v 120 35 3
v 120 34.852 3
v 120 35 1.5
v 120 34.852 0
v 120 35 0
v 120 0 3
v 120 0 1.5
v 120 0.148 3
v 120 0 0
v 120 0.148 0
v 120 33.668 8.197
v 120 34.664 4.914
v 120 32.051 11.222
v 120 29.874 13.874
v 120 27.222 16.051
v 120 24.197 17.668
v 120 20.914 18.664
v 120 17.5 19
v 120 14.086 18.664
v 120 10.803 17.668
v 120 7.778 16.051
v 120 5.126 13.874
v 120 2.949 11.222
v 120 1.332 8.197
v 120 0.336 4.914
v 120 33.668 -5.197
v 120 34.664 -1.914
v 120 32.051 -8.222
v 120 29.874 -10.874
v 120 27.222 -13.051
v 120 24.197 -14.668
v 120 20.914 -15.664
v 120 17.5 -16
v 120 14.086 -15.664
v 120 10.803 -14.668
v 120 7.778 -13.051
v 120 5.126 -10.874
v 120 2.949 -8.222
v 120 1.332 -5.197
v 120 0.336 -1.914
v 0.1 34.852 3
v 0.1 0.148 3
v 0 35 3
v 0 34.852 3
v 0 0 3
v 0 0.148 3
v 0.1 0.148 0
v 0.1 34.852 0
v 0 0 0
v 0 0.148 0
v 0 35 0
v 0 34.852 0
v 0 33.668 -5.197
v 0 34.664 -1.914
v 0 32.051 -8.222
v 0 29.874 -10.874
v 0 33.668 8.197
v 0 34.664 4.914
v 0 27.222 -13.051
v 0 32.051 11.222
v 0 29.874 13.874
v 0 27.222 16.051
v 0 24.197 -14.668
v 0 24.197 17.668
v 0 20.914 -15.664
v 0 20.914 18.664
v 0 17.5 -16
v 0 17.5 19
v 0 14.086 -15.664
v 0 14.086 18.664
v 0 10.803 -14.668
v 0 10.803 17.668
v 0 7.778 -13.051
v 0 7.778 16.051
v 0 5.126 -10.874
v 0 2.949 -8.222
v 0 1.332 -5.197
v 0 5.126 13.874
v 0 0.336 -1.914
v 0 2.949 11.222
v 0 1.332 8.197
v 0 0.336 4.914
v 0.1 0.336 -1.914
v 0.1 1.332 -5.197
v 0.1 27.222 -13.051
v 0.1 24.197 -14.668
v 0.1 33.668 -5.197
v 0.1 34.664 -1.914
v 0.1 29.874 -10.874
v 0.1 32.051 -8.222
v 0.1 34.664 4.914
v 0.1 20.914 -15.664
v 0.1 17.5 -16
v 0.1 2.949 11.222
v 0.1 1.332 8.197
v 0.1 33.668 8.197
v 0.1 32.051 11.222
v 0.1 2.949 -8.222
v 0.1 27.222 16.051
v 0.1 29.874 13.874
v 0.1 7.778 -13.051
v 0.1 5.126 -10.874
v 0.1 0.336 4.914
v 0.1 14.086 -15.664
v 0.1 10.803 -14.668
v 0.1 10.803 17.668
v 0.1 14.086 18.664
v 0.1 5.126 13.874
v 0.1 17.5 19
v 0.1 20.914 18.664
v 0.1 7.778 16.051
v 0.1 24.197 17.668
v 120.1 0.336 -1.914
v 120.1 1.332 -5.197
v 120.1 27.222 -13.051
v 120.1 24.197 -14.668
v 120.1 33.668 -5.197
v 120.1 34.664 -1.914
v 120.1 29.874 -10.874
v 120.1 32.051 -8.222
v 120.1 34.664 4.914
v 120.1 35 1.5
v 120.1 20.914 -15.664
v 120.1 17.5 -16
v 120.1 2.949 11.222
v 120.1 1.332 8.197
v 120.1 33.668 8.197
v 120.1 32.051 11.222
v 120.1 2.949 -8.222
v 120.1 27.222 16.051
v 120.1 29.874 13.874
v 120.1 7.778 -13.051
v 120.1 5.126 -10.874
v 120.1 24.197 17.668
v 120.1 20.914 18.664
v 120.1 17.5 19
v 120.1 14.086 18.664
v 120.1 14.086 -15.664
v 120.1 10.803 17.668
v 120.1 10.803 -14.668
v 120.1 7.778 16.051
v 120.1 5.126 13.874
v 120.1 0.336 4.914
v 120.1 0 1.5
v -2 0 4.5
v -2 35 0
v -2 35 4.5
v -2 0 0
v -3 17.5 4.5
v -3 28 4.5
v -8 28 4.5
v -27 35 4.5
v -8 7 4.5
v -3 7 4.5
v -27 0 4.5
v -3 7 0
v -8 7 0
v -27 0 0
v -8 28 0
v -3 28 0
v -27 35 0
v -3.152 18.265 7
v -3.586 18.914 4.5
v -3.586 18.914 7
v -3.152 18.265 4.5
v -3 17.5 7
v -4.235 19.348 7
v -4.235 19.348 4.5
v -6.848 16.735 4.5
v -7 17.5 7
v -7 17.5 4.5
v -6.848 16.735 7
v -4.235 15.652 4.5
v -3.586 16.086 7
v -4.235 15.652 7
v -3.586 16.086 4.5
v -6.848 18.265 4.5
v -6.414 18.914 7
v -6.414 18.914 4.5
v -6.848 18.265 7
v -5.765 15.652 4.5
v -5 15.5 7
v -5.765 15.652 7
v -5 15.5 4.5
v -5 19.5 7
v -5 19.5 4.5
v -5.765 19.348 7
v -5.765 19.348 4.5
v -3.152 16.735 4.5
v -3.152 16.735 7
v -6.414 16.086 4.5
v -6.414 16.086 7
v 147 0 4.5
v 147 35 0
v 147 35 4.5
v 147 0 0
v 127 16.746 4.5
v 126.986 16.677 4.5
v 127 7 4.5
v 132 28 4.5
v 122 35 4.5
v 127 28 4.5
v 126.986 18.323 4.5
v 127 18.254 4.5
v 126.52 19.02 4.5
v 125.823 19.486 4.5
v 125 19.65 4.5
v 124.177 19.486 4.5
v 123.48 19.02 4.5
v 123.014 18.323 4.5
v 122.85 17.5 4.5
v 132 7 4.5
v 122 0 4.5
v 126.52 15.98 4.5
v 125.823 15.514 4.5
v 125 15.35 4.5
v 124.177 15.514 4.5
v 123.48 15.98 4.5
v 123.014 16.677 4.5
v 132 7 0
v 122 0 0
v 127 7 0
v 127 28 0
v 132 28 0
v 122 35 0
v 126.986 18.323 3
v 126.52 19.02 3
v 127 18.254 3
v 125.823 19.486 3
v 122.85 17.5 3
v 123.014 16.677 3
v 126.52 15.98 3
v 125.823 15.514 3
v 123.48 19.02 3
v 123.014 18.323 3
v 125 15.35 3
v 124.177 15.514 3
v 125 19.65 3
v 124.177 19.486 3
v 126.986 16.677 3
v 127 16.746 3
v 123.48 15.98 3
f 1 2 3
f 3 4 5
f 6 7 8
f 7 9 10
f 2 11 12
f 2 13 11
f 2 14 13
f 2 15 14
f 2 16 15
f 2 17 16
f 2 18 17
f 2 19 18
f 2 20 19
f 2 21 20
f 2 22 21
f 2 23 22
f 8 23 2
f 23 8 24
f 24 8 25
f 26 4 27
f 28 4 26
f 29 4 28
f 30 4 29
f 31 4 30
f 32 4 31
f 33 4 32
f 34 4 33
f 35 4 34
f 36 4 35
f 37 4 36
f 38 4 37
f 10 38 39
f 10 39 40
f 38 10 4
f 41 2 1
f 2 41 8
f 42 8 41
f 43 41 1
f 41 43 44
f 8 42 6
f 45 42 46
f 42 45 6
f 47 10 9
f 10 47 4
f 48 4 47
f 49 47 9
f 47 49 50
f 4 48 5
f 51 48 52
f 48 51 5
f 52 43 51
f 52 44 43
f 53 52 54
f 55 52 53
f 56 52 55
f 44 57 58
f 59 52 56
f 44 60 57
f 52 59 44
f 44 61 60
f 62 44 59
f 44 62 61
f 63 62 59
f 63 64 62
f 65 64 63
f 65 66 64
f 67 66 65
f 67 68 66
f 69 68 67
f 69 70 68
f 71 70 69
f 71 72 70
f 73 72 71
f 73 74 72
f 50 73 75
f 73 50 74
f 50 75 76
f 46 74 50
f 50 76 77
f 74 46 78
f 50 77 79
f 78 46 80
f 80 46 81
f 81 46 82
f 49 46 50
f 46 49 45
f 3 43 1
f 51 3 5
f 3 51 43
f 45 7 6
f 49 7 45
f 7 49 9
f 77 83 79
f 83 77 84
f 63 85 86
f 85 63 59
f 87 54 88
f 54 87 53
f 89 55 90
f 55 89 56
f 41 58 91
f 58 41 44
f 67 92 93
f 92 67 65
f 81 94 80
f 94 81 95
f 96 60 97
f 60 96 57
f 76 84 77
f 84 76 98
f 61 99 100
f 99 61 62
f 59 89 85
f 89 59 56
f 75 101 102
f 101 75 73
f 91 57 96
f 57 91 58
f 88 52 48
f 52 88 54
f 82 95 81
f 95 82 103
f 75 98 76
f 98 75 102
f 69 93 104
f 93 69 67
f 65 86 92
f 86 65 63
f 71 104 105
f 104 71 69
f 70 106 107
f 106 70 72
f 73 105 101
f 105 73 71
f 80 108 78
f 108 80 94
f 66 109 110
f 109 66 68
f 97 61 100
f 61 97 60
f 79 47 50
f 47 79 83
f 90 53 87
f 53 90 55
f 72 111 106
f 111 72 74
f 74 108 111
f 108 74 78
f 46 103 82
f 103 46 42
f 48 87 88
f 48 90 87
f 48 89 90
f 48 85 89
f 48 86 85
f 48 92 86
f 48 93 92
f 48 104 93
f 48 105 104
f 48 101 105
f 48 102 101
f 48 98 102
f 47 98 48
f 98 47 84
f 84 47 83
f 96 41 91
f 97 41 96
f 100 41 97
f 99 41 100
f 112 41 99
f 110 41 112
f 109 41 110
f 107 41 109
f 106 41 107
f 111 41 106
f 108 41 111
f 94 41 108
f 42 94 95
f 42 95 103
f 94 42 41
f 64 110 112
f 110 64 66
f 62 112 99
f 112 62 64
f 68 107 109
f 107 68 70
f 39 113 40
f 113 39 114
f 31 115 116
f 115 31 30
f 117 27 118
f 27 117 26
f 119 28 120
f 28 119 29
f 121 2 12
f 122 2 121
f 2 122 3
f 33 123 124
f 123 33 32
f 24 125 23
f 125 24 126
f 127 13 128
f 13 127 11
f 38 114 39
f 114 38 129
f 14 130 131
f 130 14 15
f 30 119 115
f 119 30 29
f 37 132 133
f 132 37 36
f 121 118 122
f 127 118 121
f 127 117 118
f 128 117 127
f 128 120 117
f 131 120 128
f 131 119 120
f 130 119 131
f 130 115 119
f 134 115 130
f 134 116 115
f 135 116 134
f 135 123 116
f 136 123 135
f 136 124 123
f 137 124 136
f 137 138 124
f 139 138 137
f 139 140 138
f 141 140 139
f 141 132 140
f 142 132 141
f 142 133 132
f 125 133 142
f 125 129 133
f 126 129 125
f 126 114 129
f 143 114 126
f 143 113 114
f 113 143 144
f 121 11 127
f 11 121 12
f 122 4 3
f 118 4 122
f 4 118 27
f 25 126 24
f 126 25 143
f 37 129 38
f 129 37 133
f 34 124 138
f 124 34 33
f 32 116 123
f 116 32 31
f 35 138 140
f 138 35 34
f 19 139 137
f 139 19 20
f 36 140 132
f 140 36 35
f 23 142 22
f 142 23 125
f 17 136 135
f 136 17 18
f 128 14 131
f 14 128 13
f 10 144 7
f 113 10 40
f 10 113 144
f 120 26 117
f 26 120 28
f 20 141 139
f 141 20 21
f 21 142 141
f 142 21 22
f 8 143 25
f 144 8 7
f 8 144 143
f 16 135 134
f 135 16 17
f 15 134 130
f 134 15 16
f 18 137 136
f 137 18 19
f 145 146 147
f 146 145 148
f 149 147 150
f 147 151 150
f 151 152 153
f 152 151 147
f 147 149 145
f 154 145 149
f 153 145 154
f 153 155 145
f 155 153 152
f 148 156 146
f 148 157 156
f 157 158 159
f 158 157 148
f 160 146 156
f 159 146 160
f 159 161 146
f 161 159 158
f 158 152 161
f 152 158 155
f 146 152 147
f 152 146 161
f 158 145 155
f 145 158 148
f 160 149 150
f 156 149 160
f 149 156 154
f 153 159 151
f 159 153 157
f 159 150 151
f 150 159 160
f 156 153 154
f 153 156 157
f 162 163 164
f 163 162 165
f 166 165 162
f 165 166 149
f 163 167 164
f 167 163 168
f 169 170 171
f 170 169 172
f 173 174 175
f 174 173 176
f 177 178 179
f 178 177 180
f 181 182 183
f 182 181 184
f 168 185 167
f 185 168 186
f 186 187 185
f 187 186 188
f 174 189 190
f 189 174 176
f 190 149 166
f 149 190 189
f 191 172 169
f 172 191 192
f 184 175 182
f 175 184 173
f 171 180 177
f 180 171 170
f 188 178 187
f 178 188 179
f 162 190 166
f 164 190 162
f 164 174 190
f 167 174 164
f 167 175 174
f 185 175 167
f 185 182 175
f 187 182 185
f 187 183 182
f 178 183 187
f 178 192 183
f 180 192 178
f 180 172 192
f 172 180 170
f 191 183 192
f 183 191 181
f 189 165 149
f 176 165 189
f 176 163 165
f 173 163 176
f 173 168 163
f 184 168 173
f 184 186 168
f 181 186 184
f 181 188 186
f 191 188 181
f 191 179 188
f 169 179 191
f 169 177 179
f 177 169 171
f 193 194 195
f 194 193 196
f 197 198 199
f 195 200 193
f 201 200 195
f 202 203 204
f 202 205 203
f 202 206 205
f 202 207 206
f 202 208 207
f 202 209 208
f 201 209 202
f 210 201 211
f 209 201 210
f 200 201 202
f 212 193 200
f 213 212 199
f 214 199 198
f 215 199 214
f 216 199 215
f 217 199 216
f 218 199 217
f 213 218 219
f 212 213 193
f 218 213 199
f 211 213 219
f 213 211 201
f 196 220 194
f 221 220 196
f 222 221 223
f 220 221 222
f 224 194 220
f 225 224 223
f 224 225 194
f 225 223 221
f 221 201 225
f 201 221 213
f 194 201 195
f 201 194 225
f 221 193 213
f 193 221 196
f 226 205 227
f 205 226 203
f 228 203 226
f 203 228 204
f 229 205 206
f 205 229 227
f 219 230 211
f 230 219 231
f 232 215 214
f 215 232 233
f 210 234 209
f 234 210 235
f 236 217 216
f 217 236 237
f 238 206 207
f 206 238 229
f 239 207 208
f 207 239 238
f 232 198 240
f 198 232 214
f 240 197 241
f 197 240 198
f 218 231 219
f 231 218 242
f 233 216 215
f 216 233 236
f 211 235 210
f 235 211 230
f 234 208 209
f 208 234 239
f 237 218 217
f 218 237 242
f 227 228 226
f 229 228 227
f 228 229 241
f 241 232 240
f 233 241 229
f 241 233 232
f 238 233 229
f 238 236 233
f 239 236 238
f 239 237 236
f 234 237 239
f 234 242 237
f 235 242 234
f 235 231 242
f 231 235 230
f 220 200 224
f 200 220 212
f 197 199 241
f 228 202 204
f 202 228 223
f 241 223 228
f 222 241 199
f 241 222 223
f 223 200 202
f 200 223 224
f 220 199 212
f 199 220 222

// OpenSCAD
// Auxetic Cuff Bracelet — Negative Poisson Ratio Metamaterial
// Stretches when pulled, contracts when compressed — magical feel
// TPU 95A or flexible PLA — 0.15mm, 2 walls, 0% infill
// DUAL COLOR: cuff base (skin tone) + auxetic pattern (contrast)
// Print flat, flex onto wrist — adjustable by pulling ends

WRIST_C  = 170;   // Wrist circumference (mm) — adjust per size
CUFF_W   = 35;    // Cuff width
CUFF_T   = 3.0;   // Cuff thickness
UNIT     = 12;    // Auxetic cell unit size
GAP      = 1.6;   // Cut gap (determines stretch range)
WALL     = 1.4;   // Cell wall thickness
CLASP_L  = 25;    // Snap clasp length
CLASP_T  = 4.5;

// ── Auxetic re-entrant honeycomb cell ─────────────────
module auxetic_cell(u, g, w) {
    // Re-entrant hexagon — the key shape
    // Arms angle inward (negative) at θ=30°
    theta = 30;
    arm_l = u * 0.45;
    v_h   = u * 0.55;

    difference() {
        square([u, u], center = true);
        // Re-entrant hexagon cutout
        polygon([
            [-u/2 + w,     0],
            [-u/2 + w + arm_l * cos(theta),  arm_l * sin(theta)],
            [u/2 - w - arm_l * cos(theta),   arm_l * sin(theta)],
            [u/2 - w,      0],
            [u/2 - w - arm_l * cos(theta),  -arm_l * sin(theta)],
            [-u/2 + w + arm_l * cos(theta), -arm_l * sin(theta)],
        ]);
    }
}

// ── Cuff body (flat print, wrap onto wrist) ───────────
FLAT_L = WRIST_C - CLASP_L * 2;  // Flat span
COLS   = floor(FLAT_L / UNIT);
ROWS   = floor(CUFF_W / UNIT);

module cuff_flat() {
    difference() {
        // Base rectangle
        cube([FLAT_L, CUFF_W, CUFF_T]);
        // Auxetic pattern cutouts
        for (col = [0 : COLS - 1], row = [0 : ROWS - 1])
            translate([col * UNIT + UNIT/2, row * UNIT + UNIT/2, -0.1])
                linear_extrude(CUFF_T + 0.2)
                    auxetic_cell(UNIT, GAP, WALL);
    }
    // Rounded ends
    for (x = [0, FLAT_L])
        translate([x, CUFF_W/2, CUFF_T/2])
            rotate([0, 90, 0])
                cylinder(d = CUFF_W, h = 0.1, $fn = 32);
}

// ── Snap clasp (each end) ─────────────────────────────
module clasp_male() {
    // T-snap — press fit
    difference() {
        cube([CLASP_L, CUFF_W, CLASP_T]);
        // Slot for female counterpart
        translate([CLASP_L - 6, CUFF_W * 0.2, -1])
            cube([5, CUFF_W * 0.6, CLASP_T + 2]);
    }
    // Snap nub
    translate([CLASP_L - 3, CUFF_W/2, CLASP_T])
        cylinder(d = 4, h = 2.5, $fn = 16);
}

module clasp_female() {
    difference() {
        cube([CLASP_L, CUFF_W, CLASP_T]);
        // Nub hole
        translate([3, CUFF_W/2, CLASP_T - 1.5])
            cylinder(d = 4.3, h = 3, $fn = 16);
        // Slot
        translate([5, CUFF_W * 0.2, -1])
            cube([5, CUFF_W * 0.6, CLASP_T + 2]);
    }
}

// Color 1: cuff body
cuff_flat();
// Color 2: auxetic overlay (print as separate layer in BambuStudio → assign AMS 2)
// (In practice: the cutouts expose the bed color OR use pause-at-layer for 2-color)

// Clasps (same color as body)
translate([-CLASP_L - 2, 0, 0]) clasp_male();
translate([FLAT_L + 2, 0, 0])   clasp_female();
